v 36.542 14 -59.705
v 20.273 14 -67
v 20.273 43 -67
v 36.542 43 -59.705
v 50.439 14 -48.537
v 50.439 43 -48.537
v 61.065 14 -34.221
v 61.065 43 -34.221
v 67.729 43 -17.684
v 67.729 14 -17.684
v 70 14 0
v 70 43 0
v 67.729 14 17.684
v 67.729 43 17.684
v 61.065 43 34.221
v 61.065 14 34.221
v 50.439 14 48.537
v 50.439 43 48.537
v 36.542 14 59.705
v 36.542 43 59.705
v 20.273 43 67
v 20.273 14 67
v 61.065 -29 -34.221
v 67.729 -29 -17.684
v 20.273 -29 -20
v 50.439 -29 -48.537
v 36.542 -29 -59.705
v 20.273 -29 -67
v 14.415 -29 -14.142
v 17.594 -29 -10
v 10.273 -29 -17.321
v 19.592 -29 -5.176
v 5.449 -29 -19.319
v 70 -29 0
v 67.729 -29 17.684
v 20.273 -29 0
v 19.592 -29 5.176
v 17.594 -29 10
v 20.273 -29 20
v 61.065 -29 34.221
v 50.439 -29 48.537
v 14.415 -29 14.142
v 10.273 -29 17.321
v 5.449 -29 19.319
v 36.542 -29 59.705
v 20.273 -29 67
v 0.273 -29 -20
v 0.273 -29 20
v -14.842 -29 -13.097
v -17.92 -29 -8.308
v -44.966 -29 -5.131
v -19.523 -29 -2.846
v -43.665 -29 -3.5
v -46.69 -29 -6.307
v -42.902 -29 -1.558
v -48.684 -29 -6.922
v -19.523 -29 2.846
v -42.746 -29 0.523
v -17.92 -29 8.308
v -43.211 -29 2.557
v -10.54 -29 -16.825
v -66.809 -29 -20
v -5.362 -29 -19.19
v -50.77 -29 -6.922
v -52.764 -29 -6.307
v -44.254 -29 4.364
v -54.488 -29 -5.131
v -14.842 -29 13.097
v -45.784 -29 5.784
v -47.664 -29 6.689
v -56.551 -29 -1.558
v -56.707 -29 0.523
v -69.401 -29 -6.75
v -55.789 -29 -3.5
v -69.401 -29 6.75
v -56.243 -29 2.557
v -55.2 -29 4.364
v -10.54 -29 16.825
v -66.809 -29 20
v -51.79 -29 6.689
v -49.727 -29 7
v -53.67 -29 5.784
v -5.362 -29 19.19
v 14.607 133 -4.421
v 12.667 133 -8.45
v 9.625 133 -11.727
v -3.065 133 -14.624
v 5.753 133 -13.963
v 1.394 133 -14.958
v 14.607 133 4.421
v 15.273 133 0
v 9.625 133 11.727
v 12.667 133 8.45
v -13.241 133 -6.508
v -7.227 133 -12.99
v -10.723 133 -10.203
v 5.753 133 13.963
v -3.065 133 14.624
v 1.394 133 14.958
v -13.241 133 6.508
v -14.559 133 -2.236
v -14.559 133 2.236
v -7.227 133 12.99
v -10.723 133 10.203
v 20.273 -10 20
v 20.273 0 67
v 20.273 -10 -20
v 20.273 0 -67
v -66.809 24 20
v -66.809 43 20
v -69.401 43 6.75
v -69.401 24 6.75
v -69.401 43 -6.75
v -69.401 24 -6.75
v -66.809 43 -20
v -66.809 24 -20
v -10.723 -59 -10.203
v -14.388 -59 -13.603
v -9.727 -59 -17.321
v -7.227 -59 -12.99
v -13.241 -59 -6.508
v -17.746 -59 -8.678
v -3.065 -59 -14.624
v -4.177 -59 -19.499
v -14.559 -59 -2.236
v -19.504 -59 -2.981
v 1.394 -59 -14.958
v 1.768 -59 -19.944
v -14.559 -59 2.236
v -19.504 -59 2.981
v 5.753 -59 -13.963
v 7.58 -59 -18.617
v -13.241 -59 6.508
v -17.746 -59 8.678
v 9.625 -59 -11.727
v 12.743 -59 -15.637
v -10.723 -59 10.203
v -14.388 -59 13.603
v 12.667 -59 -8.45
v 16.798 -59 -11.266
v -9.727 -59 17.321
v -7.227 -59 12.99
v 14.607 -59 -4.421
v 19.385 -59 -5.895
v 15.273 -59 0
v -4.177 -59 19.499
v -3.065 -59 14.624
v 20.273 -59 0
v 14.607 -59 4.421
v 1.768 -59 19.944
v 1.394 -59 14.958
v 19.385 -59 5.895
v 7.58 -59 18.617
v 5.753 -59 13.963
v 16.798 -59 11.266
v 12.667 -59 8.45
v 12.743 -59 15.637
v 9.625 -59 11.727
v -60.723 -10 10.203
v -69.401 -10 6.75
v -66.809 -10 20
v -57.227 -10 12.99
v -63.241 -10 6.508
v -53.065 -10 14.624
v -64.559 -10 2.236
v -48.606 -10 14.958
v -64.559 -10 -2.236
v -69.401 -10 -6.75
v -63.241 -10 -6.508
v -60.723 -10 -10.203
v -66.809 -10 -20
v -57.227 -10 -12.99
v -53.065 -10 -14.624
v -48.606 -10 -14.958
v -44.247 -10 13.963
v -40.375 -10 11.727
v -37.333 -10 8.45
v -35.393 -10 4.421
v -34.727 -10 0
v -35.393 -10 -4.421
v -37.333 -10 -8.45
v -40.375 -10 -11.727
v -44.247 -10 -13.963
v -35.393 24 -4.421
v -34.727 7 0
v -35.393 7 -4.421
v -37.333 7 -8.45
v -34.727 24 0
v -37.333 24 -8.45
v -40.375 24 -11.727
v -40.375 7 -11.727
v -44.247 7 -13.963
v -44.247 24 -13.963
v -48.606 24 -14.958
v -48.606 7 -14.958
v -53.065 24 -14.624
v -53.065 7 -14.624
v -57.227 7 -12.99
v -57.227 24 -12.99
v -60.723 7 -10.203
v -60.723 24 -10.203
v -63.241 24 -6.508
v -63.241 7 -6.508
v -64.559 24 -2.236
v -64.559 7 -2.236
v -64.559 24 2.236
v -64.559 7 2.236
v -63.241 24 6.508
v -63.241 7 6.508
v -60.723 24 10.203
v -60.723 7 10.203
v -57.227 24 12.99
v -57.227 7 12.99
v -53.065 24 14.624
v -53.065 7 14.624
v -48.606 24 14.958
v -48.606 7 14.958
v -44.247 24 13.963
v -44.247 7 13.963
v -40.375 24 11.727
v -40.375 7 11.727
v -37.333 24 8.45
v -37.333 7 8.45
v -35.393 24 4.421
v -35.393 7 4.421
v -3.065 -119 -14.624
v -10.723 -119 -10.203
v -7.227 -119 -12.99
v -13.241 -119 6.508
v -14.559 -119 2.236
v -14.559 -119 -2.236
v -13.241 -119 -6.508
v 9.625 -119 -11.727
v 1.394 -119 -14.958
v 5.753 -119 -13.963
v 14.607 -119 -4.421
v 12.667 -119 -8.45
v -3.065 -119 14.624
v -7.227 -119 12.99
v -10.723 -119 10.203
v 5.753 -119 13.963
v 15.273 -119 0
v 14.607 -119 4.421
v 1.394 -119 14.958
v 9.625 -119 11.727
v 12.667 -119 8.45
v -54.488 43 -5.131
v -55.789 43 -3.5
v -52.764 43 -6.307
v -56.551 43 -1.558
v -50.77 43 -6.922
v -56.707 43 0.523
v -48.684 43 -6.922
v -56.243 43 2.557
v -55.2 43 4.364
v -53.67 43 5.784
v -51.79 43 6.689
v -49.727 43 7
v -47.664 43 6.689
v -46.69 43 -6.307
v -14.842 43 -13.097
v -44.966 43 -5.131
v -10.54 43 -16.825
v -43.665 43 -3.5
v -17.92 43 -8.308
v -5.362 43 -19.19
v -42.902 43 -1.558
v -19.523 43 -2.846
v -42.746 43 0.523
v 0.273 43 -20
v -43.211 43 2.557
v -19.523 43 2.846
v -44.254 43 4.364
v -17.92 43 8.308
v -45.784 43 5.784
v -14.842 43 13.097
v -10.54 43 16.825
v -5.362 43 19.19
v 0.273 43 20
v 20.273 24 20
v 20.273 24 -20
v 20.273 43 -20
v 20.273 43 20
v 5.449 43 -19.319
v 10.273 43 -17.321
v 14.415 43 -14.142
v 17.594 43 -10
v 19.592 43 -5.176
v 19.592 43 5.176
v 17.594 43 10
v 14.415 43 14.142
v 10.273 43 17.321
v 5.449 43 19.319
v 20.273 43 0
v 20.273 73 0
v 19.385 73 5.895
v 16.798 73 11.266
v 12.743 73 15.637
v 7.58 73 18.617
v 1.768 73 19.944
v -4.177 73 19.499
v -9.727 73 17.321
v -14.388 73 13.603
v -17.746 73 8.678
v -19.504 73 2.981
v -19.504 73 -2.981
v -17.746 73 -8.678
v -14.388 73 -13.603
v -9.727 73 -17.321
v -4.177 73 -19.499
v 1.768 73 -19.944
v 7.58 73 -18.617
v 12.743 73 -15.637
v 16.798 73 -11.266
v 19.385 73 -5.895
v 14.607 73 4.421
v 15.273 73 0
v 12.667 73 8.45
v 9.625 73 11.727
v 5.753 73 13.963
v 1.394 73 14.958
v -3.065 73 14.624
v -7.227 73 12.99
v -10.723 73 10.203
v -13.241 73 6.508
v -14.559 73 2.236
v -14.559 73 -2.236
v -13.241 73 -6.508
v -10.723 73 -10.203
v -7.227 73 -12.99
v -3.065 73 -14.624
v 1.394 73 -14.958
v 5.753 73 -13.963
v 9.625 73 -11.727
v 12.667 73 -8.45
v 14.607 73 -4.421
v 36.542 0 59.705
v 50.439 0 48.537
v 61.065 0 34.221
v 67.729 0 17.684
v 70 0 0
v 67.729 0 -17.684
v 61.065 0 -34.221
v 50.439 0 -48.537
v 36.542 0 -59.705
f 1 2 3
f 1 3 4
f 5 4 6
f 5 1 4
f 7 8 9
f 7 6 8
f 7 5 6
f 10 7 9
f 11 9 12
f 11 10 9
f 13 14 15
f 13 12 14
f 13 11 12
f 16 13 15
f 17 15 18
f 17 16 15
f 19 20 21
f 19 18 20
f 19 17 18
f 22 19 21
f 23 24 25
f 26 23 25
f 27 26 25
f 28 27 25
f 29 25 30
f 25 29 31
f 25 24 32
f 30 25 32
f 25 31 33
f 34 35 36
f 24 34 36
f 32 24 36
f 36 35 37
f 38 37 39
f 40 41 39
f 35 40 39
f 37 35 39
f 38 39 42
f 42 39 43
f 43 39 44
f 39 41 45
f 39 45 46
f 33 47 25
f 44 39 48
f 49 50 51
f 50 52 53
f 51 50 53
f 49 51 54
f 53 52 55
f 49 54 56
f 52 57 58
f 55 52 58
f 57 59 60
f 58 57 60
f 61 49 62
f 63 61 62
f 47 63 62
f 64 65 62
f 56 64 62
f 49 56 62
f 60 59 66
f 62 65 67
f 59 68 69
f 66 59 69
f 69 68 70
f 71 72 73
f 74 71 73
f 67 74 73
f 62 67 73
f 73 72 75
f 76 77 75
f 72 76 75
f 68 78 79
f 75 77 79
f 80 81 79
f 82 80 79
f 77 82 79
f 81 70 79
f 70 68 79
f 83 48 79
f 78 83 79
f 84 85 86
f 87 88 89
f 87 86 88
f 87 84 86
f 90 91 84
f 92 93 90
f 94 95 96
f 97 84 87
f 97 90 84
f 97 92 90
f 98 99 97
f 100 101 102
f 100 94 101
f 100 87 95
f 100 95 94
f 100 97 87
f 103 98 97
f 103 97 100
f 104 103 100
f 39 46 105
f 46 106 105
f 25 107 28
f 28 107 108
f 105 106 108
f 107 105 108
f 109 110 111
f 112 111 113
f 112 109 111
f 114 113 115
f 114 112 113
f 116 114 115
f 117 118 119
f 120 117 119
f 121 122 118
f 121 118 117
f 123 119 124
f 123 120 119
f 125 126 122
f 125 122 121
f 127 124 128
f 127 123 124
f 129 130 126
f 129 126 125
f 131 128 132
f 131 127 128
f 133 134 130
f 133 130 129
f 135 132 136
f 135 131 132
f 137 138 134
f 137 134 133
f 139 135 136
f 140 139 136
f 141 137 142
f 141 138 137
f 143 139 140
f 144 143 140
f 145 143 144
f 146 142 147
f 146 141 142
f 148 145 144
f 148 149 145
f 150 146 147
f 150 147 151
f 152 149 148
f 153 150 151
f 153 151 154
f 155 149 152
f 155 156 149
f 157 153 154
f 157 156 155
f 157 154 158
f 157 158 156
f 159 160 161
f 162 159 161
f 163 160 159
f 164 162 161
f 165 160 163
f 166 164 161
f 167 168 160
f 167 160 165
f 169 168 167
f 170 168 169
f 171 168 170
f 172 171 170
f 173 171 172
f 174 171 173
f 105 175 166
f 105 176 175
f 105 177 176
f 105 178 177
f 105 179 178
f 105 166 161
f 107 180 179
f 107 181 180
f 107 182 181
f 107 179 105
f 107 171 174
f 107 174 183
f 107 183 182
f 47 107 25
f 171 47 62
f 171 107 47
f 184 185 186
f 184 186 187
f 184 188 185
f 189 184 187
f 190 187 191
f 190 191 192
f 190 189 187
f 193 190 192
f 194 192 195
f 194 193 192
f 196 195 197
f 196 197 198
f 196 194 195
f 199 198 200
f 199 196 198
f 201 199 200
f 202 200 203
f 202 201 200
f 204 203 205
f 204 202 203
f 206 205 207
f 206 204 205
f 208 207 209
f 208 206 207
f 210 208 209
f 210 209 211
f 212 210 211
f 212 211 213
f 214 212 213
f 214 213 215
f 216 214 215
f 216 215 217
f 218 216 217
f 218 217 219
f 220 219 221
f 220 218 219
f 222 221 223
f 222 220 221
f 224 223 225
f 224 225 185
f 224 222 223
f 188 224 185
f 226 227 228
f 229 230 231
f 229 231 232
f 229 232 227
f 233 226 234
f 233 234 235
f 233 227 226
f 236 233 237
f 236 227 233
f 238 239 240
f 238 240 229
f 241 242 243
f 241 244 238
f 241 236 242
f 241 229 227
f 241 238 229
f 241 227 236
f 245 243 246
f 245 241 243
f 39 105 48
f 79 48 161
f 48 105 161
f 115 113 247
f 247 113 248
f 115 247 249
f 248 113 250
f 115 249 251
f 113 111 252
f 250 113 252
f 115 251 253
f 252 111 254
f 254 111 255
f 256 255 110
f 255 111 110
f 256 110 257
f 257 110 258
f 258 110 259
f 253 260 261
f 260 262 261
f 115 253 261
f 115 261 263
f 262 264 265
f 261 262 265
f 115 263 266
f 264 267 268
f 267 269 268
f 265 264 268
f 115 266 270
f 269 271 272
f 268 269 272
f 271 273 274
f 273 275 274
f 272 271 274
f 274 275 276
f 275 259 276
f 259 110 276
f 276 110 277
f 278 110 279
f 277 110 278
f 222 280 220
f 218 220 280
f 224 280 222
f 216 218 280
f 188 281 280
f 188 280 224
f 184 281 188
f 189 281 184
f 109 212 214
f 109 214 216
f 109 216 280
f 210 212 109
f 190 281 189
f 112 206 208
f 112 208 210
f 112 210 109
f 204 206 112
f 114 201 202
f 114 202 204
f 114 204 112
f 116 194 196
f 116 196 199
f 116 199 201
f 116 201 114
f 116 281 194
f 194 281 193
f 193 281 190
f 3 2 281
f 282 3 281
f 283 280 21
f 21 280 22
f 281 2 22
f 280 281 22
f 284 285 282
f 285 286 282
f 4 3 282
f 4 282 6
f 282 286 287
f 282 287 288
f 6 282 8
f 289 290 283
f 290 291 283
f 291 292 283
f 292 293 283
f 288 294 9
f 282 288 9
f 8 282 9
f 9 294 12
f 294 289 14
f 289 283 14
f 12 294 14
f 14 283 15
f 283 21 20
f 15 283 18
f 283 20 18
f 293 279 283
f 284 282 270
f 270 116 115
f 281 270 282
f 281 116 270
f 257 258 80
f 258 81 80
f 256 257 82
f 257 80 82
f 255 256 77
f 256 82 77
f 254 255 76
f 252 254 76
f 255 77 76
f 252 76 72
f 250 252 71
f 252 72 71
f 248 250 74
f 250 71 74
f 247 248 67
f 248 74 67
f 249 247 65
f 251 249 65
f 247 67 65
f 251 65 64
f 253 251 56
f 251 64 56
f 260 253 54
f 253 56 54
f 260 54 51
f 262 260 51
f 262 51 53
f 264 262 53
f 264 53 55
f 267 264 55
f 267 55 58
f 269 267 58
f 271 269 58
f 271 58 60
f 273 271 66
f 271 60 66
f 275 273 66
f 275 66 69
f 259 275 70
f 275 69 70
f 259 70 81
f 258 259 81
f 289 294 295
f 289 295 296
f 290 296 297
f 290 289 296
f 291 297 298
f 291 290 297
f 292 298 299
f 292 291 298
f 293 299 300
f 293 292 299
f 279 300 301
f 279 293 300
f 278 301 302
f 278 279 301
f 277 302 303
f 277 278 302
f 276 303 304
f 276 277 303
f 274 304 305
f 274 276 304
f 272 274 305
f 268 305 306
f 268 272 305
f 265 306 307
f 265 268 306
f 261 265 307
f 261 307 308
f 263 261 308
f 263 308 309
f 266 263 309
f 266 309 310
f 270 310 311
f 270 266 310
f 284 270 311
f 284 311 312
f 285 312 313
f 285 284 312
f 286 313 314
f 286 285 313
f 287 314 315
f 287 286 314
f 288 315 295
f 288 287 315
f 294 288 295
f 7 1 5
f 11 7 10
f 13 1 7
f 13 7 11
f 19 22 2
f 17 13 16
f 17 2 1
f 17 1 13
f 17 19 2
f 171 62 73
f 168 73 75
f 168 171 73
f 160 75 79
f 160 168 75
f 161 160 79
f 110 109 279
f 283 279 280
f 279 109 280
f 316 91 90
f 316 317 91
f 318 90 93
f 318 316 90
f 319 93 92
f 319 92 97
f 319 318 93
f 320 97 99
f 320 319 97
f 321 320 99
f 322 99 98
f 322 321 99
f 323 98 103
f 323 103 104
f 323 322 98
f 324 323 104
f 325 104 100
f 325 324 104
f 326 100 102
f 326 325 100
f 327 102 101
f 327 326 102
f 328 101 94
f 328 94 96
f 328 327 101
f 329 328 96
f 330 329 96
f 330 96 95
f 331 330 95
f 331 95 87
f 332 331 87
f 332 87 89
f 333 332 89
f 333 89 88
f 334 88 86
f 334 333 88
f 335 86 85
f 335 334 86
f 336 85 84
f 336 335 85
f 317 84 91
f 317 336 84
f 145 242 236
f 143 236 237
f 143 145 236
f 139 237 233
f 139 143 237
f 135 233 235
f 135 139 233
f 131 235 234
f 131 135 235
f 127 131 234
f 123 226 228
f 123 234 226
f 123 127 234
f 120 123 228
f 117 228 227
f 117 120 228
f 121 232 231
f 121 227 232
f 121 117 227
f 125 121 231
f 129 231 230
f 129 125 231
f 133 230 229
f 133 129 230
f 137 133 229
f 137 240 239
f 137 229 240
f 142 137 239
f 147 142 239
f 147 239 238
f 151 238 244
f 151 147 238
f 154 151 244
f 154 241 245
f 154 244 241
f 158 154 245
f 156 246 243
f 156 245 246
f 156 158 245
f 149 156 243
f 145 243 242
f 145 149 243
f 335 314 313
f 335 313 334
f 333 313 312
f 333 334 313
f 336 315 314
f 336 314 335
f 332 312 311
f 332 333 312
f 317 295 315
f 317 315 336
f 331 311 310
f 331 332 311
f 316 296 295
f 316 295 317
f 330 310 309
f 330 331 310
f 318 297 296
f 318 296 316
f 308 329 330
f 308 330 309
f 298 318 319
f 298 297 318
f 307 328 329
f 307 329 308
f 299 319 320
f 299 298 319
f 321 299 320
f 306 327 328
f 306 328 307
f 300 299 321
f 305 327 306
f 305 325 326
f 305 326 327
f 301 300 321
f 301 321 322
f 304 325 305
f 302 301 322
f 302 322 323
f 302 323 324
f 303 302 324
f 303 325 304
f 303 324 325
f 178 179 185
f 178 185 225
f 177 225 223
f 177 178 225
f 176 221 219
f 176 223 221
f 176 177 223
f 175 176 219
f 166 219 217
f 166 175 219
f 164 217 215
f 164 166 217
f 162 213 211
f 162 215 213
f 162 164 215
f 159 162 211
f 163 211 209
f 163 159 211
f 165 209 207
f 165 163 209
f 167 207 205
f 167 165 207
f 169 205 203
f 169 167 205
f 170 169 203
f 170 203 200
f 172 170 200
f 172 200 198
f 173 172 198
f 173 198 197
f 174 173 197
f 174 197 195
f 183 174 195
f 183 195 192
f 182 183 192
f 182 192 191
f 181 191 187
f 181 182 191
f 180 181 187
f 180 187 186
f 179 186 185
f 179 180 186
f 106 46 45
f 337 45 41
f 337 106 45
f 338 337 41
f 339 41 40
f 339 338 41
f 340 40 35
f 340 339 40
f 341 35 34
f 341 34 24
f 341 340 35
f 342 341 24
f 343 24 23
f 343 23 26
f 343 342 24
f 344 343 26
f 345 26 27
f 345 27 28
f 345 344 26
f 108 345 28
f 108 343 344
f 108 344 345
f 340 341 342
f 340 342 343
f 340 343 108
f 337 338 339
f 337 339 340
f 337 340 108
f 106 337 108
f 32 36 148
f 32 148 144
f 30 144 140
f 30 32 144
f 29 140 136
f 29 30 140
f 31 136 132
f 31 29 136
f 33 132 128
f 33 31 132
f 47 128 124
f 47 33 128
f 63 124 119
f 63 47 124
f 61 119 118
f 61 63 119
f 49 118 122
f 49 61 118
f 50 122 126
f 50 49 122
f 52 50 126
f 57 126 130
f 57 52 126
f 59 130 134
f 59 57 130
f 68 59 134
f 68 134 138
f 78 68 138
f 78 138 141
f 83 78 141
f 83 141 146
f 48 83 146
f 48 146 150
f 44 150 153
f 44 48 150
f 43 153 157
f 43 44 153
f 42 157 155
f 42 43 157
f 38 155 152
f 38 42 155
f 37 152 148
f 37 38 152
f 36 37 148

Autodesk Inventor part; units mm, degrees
ref_plane "YZ Plane" through (0, 0, 0) normal (1, 0, 0) x (0, 1, 0)
ref_plane "XZ Plane" through (0, 0, 0) normal (0, 1, 0) x (-1, 0, 0)
sketch "Sketch1" plane through (0, 0, 0) normal (0, 1, 0) x (-1, 0, 0)
  arc A0 (-20.2731, 67) -> (-20.2731, -67) centre (0, 0) ccw
  line L0 (0, 67) -> (0, -67)
  line L1 (0, -67) -> (-20.2731, -67)
  line L2 (-20.2731, 67) -> (-20.2731, -67)
  line L3 (-20.2731, 0) -> (-0.2731, 0)
  circle A1 centre (-0.2731, 0) radius 20
  circle A2 centre (-0.2731, 0) radius 15
  line L4 (-20.2731, 20) -> (69.7269, 20)
  arc A3 (66.8089, -20) -> (66.8089, 20) centre (-0.2731, 0) ccw
  line L5 (-20.2731, -20) -> (66.8089, -20)
  dimension "d0" = 140
  dimension "d1" = 134
  dimension "d2" = 20
  dimension "d3" = 30
  dimension "d4" = 90
extrude "Extrusion1" add sketch "Sketch1" against normal blind 29 contours L2 A0 | L4 A1 L2 | L2 A1 L5 | A1 L0 A2 L3 | L3 A2 L0 A1 | A1 L0 A2 | L4 A3 L5 A1 | A2 L0 | A2 L0
sketch "Sketch2" plane through (0, 0, 0) normal (0, 1, 0) x (1, 0, 0)
  line L0 (-66.8089, 20) -> (20.2731, 20) projected
  line L1 (20.2731, -20.1759) -> (20.2731, 20)
  line L2 (20.2731, -20.1759) -> (-74.6075, -20.1759)
  line L3 (-74.6075, -20.1759) -> (-74.6075, 20)
  line L4 (-74.6075, 20) -> (20.2731, 20)
  line L5 (20.2731, 20) -> (20.2731, -20.1759)
  point P0 (0, 0)
extrude "Extrusion2" cut sketch "Sketch2" against normal blind 10
ref_plane "Work Plane1" through (0, 7, 0) normal (0, 1, 0) x (1, 0, 0)
sketch "Sketch3" plane through (0, -29, 0) normal (0, -1, 0) x (1, 0, 0)
  line L0 (20.2731, -67) -> (20.2731, 67) projected
  line L1 (20.2731, 0) -> (0.2731, 0)
  circle A0 centre (0.2731, 0) radius 20
  point P0 (0, 0)
  dimension "d10" = 20
extrude "Extrusion3" add sketch "Sketch3" along normal blind 30
sketch "Sketch4" plane through (0.2731, -59, 0) normal (0, -1, 0) x (1, 0, 0)
  point P0 (-0.2731, 0)
sketch "Sketch5" plane through (0, -29, 0) normal (0, -1, 0) x (1, 0, 0)
  line L0 (20.2731, -67) -> (20.2731, 67) projected
  line L1 (20.2731, 0) -> (0.2731, 0)
  circle A0 centre (0.2731, 0) radius 15
  point P0 (0, 0)
  dimension "d13" = 20
  dimension "d14" = 30
extrude "Extrusion4" add sketch "Sketch5" along normal blind 90
sketch "Sketch6" plane through (0, 0, 0) normal (0, 1, 0) x (1, 0, 0)
  point P0 (0, 0)
sketch "Sketch7" plane through (0, -10, 0) normal (0, 1, 0) x (1, 0, 0)
  line L0 (20.2731, 67) -> (20.2731, -67) projected
  line L1 (20.2731, 0) -> (-49.7269, 0)
  circle A0 centre (-49.7269, 0) radius 15
  point P0 (0, 0)
  dimension "d17" = 70
  dimension "d18" = 30
extrude "Extrusion5" add sketch "Sketch7" along normal blind 17
mirror "Mirror1" about plane through (0, 7, 0) normal (0, 1, 0) of "Extrusion1", "Extrusion5", "Extrusion3", "Extrusion4", "Extrusion2"
hole "Hole1" at (-49.7269, 43, 0) direction (0, -1, 0) diameter 14 end through all
sketch "Sketch8" plane through (0, 7, 0) normal (0, 1, 0) x (1, 0, 0)
  arc A0 (0.2731, -20) -> (0.2731, 20) centre (0.2731, 0) ccw projected
  line L0 (20.2731, 0) -> (0.2731, 0)
  circle A1 centre (0.2731, 0) radius 15
  point P0 (0, 0)
  dimension "d30" = 20
properties part number "crank"
